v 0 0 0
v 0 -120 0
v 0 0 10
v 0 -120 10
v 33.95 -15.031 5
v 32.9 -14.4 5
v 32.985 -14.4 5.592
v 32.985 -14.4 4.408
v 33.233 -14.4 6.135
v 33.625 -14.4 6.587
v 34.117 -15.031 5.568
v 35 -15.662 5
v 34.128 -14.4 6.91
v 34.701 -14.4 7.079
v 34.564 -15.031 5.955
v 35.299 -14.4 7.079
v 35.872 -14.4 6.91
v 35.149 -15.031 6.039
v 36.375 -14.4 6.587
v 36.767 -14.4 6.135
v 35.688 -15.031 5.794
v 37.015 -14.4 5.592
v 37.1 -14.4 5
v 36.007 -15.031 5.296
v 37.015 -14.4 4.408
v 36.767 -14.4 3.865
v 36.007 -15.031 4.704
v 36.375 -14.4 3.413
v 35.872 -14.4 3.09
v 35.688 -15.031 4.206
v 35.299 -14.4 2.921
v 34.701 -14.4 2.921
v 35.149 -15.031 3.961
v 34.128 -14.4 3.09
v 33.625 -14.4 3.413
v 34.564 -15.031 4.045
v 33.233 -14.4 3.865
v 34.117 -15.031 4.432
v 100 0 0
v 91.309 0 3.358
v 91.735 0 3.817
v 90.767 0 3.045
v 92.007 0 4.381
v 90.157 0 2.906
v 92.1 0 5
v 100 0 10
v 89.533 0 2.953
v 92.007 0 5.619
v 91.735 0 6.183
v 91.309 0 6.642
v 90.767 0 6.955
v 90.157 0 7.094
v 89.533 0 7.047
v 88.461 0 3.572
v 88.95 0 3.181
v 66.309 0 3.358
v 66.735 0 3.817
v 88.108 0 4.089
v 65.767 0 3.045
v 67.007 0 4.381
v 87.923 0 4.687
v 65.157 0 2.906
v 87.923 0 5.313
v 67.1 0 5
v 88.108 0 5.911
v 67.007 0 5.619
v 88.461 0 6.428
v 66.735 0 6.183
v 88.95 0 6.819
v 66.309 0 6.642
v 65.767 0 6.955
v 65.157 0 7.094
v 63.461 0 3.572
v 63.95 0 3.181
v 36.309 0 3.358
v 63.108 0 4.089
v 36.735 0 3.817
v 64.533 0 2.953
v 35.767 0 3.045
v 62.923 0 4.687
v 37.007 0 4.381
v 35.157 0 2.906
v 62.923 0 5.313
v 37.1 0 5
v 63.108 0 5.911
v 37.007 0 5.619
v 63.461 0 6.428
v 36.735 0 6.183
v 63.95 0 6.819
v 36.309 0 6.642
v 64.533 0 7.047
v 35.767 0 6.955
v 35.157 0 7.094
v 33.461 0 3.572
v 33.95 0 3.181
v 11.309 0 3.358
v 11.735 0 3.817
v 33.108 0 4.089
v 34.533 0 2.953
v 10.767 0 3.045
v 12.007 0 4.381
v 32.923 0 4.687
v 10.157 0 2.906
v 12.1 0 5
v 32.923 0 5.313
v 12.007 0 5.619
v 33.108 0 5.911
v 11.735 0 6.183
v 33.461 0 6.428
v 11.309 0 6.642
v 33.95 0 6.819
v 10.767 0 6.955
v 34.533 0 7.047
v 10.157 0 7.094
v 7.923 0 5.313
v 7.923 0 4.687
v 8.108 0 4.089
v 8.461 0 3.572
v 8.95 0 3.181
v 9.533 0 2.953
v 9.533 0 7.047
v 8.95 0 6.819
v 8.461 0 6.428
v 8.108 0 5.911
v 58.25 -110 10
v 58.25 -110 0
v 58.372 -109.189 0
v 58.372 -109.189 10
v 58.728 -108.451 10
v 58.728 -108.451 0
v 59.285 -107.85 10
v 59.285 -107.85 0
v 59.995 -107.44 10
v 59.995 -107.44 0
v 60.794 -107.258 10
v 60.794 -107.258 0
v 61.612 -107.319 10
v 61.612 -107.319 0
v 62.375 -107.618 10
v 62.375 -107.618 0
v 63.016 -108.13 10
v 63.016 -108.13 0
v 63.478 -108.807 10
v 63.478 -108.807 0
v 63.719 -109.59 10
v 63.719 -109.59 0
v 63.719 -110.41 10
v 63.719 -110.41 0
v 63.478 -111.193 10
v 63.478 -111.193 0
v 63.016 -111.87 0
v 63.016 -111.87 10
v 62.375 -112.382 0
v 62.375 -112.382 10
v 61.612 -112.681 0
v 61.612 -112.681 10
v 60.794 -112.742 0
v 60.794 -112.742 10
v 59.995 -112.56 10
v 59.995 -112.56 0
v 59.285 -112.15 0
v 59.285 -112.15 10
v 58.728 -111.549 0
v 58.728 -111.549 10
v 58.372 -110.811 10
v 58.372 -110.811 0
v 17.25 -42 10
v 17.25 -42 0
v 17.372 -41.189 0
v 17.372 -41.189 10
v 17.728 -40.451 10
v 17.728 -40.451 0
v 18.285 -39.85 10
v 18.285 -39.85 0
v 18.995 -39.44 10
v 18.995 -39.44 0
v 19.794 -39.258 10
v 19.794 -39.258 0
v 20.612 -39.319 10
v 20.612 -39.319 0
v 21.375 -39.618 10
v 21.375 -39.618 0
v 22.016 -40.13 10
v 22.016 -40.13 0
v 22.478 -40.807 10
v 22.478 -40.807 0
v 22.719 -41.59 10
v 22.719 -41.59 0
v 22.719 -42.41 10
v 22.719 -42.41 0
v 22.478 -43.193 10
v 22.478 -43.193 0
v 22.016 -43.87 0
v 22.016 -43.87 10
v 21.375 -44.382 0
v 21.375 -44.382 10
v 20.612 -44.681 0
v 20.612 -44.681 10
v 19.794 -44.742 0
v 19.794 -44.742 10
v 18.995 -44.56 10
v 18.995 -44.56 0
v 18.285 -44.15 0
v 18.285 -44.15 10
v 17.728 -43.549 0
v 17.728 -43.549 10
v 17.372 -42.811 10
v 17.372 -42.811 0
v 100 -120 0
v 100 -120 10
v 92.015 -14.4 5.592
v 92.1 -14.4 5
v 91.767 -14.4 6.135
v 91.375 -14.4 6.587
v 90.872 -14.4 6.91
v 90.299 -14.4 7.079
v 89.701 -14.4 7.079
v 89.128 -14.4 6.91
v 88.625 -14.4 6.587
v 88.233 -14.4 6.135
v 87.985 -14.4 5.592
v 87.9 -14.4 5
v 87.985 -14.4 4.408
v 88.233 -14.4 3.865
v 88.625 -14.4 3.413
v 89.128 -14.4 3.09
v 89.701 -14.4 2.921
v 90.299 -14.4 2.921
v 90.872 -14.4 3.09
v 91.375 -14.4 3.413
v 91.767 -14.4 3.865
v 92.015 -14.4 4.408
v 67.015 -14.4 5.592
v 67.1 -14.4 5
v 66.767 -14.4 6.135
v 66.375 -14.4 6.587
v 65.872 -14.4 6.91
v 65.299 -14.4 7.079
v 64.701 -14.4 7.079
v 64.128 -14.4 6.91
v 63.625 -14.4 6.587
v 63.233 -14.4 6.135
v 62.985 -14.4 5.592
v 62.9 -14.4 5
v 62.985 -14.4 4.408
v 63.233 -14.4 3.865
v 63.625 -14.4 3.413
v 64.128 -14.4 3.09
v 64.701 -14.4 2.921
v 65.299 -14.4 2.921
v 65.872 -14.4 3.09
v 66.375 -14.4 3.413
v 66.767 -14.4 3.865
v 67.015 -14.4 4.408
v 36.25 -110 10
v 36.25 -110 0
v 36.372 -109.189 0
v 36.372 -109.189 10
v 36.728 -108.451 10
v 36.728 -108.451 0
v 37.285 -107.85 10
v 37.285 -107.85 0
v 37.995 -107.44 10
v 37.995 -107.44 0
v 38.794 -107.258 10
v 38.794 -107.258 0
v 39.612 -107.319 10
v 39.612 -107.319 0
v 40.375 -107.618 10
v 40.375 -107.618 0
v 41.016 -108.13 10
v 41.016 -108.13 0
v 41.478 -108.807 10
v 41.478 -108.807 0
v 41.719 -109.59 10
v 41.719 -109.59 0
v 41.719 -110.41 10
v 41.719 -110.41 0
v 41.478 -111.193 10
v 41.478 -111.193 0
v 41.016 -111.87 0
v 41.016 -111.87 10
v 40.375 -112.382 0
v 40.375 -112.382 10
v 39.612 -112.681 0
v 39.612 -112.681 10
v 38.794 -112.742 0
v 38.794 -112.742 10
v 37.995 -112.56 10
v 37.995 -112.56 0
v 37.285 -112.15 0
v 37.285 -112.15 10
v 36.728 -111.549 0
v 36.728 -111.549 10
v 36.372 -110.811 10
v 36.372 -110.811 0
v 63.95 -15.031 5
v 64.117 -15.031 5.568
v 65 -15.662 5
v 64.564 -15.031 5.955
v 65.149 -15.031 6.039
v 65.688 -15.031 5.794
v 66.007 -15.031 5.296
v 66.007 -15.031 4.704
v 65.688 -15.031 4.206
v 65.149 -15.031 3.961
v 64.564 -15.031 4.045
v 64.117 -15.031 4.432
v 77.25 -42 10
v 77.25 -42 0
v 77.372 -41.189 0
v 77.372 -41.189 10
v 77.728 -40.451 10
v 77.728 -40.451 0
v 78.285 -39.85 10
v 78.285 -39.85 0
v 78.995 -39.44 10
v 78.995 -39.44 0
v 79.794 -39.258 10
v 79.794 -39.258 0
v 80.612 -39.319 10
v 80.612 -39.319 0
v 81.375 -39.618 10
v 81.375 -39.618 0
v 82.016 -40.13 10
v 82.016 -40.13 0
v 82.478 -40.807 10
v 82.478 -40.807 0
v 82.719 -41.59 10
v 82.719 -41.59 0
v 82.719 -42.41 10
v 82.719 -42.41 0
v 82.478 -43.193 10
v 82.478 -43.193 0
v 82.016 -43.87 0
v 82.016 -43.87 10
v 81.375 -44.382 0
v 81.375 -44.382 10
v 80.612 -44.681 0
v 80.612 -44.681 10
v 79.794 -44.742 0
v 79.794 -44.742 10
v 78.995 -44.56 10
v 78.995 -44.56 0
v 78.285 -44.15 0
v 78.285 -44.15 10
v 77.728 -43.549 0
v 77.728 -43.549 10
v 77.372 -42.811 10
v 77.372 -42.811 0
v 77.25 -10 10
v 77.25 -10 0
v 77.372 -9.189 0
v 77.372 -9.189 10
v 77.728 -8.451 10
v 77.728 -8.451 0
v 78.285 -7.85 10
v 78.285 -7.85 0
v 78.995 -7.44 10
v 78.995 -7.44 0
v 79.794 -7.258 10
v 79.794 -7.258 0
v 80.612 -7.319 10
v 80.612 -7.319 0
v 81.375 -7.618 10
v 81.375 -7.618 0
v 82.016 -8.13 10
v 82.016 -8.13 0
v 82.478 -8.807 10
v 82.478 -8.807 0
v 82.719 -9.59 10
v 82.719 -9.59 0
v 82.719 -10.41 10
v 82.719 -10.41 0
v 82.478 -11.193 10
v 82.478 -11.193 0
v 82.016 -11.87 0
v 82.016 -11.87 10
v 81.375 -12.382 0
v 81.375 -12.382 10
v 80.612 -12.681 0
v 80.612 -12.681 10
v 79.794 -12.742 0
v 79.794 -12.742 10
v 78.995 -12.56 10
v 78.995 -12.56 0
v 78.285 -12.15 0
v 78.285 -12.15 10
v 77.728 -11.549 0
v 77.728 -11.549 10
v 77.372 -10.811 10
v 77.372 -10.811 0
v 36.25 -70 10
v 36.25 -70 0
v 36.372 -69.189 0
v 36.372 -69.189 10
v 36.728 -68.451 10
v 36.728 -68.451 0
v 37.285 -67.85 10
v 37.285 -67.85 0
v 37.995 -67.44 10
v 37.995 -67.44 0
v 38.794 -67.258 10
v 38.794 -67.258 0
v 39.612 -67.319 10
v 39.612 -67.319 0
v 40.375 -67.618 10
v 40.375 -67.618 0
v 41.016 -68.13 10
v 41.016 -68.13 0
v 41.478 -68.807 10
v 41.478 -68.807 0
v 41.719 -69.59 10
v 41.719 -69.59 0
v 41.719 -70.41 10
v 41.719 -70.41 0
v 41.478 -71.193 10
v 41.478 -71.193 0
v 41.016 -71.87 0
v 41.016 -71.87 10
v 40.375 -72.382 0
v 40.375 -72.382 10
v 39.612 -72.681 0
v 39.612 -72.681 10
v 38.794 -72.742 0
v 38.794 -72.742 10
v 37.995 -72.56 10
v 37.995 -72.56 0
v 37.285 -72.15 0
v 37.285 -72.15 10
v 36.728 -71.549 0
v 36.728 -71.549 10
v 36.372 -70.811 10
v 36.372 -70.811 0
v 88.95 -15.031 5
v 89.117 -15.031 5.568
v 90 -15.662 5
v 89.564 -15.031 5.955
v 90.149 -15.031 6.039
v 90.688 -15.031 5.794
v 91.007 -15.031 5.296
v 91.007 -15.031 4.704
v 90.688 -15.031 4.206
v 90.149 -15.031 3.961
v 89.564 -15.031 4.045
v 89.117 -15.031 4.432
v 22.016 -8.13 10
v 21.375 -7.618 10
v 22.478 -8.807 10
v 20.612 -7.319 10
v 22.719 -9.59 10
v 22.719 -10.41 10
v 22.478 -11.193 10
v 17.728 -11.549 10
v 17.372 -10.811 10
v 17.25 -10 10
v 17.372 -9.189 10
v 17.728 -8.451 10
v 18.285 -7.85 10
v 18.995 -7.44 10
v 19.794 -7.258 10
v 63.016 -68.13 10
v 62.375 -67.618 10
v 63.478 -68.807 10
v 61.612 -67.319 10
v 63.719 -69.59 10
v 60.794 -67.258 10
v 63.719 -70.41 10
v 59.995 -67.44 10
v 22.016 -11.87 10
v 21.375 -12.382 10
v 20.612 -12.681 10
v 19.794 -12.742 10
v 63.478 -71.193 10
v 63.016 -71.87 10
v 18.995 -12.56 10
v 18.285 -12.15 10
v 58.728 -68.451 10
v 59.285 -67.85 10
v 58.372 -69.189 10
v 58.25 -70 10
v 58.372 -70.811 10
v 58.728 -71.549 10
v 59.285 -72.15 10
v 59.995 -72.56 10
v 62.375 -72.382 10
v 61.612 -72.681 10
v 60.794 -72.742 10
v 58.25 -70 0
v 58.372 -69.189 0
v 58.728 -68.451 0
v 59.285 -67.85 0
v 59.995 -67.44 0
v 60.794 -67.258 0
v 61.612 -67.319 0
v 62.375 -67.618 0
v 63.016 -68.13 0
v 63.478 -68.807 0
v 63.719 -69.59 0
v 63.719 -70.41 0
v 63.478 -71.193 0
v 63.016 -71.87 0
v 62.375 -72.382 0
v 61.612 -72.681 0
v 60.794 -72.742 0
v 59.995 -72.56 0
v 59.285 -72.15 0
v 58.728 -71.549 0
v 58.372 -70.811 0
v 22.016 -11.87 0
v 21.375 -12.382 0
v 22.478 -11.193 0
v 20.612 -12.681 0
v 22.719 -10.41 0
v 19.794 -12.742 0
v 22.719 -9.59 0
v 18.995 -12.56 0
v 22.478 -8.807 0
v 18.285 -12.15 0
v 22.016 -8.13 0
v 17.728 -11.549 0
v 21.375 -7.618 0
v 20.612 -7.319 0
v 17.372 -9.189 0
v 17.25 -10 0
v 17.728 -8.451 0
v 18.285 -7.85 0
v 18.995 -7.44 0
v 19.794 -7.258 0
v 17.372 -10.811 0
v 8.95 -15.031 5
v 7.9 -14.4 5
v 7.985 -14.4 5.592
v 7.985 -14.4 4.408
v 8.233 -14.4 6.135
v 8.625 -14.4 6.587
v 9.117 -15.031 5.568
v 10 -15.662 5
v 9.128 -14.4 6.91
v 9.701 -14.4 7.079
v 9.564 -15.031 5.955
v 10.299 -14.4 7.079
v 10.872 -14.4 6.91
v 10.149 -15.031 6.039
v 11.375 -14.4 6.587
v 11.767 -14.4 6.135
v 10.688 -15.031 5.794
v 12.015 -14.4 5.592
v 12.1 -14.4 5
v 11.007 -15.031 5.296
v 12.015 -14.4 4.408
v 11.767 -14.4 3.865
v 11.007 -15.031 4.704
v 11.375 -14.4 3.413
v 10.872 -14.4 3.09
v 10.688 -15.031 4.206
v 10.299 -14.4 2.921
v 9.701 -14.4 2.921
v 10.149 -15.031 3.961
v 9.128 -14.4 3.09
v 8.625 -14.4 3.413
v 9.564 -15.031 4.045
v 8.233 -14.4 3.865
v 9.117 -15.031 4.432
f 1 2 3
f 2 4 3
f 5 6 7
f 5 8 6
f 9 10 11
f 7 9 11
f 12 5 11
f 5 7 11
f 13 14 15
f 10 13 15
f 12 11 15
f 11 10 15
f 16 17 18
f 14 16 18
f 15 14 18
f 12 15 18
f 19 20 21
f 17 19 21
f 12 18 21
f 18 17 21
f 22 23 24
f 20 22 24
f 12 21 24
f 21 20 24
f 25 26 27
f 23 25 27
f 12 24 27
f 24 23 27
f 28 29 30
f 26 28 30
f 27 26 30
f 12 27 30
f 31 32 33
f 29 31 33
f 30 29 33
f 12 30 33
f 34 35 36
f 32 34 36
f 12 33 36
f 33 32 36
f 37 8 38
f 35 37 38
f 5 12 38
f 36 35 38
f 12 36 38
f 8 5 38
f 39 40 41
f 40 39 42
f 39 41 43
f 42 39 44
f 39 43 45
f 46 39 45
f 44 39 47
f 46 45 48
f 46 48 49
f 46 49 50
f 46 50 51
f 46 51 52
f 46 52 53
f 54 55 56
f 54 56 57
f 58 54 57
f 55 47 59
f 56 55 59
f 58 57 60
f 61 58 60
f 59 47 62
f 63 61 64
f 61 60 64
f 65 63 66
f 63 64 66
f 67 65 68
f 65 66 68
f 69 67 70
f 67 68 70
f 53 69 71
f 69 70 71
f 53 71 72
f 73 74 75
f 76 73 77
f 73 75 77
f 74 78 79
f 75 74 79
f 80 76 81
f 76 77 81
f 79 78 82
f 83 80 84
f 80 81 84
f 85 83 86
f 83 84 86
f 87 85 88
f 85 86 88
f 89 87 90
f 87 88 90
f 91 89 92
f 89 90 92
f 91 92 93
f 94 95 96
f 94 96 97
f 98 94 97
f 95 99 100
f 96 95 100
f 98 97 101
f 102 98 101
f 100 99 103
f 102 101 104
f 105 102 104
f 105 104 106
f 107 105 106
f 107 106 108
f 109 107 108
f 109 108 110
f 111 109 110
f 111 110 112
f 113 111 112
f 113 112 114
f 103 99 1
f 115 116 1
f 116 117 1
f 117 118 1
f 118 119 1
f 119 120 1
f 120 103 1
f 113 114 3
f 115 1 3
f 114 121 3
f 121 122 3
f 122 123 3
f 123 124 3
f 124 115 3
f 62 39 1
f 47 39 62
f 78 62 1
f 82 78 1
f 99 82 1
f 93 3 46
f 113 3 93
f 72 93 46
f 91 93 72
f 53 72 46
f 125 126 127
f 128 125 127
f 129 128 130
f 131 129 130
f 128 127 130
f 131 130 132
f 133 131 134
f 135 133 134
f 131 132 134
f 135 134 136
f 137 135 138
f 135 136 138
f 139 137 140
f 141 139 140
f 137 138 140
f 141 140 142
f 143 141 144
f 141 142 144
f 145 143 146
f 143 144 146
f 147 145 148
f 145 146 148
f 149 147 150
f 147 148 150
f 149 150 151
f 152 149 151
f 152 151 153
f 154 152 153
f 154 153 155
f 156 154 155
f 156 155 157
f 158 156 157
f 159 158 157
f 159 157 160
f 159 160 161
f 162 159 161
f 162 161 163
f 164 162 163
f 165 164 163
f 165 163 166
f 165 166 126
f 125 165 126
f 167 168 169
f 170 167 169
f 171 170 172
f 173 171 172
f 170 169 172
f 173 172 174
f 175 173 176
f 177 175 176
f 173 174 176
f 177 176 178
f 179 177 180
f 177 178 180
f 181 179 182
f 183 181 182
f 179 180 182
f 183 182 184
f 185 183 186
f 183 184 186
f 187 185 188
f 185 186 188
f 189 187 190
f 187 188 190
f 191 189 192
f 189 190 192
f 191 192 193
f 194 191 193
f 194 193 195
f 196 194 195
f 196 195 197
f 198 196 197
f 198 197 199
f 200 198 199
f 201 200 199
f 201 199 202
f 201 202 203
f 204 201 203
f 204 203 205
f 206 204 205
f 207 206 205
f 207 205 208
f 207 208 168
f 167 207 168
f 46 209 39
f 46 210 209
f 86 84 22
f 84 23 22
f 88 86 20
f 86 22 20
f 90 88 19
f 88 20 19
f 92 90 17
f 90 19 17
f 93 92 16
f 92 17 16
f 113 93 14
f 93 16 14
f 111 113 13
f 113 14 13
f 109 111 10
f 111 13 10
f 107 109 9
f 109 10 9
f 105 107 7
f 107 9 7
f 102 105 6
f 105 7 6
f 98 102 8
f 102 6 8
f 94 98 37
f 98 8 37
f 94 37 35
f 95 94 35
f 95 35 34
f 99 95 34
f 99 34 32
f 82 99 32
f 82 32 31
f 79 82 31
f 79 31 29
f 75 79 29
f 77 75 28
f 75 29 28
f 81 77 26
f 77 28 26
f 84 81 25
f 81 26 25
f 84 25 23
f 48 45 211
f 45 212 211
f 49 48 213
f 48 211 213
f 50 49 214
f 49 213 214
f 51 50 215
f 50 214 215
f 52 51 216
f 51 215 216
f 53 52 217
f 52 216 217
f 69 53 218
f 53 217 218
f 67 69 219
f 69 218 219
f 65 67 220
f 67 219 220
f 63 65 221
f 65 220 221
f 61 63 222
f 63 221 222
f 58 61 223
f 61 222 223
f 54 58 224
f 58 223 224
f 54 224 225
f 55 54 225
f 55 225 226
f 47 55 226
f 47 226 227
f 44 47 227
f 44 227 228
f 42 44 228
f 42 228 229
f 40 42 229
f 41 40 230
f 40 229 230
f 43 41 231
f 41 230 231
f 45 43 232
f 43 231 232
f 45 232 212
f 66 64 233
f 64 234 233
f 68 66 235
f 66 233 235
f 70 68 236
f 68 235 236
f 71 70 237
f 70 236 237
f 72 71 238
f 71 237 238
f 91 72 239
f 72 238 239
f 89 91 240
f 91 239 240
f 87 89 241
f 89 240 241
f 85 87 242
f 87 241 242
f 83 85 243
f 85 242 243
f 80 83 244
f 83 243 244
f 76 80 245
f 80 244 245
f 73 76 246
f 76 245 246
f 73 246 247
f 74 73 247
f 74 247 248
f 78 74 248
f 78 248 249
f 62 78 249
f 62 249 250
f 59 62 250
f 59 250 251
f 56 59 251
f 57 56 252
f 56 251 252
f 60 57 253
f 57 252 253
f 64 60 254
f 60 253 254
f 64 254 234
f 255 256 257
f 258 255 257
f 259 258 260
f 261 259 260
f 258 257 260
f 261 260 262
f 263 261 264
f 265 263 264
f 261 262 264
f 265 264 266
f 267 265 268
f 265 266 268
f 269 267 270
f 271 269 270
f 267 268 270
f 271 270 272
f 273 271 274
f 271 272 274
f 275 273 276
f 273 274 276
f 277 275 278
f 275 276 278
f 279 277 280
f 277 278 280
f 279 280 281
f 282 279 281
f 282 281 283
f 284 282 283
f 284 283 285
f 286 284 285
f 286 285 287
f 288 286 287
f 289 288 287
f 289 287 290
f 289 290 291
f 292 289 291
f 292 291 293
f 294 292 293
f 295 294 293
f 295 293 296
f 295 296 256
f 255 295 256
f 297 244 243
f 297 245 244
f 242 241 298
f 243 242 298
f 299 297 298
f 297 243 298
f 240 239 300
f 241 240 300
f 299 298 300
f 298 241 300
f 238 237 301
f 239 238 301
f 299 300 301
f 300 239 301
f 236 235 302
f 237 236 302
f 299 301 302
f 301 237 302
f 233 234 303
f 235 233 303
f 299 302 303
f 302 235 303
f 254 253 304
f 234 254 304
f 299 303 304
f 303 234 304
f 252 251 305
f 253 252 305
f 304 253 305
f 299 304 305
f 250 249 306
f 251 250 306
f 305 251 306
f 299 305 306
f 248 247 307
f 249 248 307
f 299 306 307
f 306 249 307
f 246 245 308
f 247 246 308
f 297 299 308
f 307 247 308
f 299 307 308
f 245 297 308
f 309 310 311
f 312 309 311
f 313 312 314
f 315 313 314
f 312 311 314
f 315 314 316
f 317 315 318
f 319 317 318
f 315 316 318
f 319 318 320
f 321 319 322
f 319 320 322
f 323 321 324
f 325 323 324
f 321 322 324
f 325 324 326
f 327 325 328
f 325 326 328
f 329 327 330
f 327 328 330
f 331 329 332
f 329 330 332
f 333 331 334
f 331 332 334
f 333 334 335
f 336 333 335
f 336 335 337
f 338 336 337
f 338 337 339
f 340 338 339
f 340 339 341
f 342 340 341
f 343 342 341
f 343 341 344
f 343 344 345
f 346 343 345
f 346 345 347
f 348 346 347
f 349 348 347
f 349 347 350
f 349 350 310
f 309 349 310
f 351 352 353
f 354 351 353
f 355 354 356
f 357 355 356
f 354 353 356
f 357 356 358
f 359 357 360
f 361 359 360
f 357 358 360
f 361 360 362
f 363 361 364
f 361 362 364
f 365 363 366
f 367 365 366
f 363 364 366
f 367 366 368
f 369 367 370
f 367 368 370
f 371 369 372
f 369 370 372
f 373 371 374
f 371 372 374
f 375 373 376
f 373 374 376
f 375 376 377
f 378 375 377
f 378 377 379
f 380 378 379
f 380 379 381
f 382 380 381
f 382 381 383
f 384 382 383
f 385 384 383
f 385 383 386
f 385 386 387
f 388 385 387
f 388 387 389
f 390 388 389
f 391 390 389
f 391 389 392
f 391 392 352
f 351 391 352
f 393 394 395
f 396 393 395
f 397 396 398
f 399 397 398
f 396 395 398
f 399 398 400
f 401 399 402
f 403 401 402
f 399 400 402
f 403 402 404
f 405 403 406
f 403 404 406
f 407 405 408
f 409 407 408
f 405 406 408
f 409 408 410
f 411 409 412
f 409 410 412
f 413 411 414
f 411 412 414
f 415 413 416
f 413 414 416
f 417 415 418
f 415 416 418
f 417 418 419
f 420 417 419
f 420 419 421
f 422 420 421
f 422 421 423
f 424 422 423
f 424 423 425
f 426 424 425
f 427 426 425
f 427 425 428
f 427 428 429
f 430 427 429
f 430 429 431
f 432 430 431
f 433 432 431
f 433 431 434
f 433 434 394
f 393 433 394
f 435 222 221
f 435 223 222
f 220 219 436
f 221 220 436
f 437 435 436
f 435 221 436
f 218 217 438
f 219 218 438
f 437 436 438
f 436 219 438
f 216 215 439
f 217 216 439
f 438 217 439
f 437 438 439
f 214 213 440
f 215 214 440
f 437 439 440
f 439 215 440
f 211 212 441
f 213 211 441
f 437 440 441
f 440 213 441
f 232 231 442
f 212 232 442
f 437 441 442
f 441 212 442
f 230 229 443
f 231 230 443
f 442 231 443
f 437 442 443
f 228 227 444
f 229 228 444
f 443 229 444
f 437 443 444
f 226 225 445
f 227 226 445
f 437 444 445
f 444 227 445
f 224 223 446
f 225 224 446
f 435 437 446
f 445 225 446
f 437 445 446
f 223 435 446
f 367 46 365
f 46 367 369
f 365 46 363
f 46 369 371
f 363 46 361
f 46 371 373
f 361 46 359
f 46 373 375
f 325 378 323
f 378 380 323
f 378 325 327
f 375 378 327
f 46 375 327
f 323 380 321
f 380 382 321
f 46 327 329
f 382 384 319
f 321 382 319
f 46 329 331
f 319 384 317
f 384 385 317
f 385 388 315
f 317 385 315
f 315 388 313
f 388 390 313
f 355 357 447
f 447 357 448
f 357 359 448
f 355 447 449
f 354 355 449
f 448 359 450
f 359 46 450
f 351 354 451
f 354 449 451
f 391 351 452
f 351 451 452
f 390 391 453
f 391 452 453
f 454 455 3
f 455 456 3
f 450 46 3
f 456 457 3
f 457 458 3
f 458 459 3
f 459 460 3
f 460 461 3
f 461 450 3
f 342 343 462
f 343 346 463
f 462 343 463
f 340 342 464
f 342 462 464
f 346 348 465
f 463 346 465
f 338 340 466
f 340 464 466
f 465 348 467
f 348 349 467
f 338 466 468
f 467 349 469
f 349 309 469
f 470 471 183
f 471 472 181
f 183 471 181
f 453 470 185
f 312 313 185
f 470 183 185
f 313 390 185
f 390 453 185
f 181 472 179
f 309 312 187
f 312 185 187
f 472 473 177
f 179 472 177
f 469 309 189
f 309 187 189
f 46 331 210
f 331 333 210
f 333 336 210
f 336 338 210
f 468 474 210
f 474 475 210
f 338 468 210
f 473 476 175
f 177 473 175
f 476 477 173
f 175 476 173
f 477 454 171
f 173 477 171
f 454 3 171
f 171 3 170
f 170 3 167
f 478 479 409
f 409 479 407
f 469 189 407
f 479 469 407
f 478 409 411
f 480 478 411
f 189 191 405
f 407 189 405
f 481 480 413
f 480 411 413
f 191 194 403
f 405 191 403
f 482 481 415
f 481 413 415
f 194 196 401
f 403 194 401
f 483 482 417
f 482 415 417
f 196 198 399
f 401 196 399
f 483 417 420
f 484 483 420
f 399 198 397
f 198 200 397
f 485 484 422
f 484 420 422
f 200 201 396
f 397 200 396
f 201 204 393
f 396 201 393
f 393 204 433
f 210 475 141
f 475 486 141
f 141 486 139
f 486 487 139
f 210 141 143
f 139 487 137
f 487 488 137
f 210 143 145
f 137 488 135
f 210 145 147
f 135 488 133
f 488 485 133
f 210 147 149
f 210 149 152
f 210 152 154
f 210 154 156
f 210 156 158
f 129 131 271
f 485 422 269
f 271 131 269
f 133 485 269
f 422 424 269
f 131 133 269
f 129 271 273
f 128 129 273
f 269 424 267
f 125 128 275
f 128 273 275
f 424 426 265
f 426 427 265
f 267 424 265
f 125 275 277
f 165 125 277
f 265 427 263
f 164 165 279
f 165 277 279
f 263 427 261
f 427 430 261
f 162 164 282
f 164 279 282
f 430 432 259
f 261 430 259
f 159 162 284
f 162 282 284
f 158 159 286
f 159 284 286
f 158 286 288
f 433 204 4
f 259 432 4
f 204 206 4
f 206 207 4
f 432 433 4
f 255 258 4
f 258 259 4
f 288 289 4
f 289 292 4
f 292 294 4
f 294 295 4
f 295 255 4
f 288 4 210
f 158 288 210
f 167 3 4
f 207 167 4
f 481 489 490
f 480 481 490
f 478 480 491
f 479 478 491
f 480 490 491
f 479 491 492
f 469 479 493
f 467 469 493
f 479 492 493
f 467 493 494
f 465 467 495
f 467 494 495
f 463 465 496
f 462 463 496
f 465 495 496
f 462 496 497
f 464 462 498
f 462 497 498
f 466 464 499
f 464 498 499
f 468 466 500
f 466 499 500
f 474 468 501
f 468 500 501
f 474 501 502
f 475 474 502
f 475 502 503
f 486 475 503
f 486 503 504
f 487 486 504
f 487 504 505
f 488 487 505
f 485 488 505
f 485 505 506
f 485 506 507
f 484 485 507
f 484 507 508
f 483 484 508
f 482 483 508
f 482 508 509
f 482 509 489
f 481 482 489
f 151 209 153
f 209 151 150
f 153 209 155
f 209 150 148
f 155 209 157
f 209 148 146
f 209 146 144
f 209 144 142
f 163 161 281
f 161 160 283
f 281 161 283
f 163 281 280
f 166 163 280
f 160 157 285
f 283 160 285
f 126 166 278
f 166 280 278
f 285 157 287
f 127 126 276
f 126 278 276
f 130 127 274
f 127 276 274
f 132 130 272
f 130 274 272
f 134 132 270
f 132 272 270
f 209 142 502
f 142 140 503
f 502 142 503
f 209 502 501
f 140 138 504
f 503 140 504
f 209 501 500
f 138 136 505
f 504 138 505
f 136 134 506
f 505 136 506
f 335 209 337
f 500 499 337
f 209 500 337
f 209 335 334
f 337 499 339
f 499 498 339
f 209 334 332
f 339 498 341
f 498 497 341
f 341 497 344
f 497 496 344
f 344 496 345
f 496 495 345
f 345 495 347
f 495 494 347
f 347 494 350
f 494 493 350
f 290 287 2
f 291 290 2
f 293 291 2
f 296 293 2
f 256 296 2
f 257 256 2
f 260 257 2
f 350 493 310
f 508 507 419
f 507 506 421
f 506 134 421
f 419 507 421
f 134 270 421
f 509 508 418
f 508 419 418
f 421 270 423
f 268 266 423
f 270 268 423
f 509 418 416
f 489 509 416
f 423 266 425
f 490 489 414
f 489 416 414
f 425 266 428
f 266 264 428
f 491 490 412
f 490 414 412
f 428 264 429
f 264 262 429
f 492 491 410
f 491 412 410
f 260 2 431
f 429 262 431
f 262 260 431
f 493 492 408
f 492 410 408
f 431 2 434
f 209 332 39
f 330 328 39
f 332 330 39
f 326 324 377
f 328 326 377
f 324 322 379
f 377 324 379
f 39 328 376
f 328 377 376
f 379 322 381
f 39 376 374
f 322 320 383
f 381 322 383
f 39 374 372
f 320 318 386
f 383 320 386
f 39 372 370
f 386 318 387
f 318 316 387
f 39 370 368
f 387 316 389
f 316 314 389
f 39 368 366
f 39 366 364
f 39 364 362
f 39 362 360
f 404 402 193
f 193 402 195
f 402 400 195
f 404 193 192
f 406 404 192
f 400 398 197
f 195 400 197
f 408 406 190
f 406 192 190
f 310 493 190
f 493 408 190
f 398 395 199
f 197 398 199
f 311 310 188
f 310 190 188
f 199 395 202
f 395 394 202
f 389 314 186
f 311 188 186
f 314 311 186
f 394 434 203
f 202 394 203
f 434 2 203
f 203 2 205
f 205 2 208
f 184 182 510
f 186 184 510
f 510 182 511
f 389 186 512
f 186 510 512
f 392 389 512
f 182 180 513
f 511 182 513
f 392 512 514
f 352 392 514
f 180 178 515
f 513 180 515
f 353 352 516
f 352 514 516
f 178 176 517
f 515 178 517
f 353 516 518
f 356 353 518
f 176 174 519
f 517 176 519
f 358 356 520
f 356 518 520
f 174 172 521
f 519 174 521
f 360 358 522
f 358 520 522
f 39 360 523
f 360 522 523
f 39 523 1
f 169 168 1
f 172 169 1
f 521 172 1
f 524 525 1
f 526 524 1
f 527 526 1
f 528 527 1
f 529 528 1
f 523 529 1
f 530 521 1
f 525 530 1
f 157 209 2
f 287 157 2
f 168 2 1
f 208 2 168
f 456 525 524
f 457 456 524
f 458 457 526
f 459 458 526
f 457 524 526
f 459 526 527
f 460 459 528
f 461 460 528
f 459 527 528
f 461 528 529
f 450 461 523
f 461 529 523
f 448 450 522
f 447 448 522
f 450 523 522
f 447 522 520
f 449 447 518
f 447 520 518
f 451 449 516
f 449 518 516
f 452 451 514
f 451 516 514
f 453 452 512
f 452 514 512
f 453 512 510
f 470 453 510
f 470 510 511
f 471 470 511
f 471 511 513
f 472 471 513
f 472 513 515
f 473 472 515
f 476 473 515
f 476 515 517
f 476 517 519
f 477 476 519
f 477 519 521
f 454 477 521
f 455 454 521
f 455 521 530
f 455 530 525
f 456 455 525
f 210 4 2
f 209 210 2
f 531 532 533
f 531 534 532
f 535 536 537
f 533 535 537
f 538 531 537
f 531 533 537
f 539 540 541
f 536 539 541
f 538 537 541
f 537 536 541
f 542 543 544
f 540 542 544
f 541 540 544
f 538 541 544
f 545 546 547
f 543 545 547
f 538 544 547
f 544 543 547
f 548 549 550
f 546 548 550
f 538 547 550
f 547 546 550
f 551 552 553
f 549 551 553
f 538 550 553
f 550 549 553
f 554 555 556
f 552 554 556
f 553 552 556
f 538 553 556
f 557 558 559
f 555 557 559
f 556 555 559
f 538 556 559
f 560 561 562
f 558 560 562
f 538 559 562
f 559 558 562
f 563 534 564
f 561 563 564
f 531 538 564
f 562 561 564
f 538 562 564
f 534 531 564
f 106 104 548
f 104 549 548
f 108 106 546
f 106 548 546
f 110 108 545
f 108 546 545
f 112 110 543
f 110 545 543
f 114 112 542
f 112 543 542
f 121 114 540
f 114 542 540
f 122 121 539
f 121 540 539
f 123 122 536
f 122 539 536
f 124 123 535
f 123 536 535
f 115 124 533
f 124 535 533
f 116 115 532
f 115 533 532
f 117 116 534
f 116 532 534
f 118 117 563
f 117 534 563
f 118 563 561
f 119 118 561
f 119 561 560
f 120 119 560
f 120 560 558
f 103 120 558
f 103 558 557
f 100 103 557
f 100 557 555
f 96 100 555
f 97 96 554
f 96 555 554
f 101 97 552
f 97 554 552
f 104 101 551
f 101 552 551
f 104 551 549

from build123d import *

# Parameters (mm, degrees)
F1_DEPTH = 100
F3_D     = 5.5
F5_D     = 4.2
F5_DEPTH = 14.4
F5_TIP   = 1.2618073


with BuildPart() as f1:
    # F0 (on Right) → F1 (new body)
    with BuildSketch(Plane.YZ):
        Polygon((-120, 0), (0, 0), (0, 10), (-10, 10), (-120, 10), align=None)
    extrude(amount=F1_DEPTH)

    # F3 (through all)
    with Locations(Plane.XY.offset(10)):
        with Locations((80, -10), (80, -42), (20, -42), (20, -10), (39, -70), (61, -70), (61, -110), (39, -110)):
            Hole(F3_D / 2)

    # F5
    with Locations(Plane(origin=(0, 0, 0), x_dir=(-1, 0, 0), z_dir=(0, 1, 0))):
        with Locations((-90, 5), (-65, 5), (-35, 5), (-10, 5)):
            Hole(F5_D / 2, depth=F5_DEPTH)
            with Locations((0, 0, -(F5_DEPTH + F5_TIP / 2))):  # 118° drill point
                Cone(0, F5_D / 2, F5_TIP, mode=Mode.SUBTRACT)


solid = f1.part
